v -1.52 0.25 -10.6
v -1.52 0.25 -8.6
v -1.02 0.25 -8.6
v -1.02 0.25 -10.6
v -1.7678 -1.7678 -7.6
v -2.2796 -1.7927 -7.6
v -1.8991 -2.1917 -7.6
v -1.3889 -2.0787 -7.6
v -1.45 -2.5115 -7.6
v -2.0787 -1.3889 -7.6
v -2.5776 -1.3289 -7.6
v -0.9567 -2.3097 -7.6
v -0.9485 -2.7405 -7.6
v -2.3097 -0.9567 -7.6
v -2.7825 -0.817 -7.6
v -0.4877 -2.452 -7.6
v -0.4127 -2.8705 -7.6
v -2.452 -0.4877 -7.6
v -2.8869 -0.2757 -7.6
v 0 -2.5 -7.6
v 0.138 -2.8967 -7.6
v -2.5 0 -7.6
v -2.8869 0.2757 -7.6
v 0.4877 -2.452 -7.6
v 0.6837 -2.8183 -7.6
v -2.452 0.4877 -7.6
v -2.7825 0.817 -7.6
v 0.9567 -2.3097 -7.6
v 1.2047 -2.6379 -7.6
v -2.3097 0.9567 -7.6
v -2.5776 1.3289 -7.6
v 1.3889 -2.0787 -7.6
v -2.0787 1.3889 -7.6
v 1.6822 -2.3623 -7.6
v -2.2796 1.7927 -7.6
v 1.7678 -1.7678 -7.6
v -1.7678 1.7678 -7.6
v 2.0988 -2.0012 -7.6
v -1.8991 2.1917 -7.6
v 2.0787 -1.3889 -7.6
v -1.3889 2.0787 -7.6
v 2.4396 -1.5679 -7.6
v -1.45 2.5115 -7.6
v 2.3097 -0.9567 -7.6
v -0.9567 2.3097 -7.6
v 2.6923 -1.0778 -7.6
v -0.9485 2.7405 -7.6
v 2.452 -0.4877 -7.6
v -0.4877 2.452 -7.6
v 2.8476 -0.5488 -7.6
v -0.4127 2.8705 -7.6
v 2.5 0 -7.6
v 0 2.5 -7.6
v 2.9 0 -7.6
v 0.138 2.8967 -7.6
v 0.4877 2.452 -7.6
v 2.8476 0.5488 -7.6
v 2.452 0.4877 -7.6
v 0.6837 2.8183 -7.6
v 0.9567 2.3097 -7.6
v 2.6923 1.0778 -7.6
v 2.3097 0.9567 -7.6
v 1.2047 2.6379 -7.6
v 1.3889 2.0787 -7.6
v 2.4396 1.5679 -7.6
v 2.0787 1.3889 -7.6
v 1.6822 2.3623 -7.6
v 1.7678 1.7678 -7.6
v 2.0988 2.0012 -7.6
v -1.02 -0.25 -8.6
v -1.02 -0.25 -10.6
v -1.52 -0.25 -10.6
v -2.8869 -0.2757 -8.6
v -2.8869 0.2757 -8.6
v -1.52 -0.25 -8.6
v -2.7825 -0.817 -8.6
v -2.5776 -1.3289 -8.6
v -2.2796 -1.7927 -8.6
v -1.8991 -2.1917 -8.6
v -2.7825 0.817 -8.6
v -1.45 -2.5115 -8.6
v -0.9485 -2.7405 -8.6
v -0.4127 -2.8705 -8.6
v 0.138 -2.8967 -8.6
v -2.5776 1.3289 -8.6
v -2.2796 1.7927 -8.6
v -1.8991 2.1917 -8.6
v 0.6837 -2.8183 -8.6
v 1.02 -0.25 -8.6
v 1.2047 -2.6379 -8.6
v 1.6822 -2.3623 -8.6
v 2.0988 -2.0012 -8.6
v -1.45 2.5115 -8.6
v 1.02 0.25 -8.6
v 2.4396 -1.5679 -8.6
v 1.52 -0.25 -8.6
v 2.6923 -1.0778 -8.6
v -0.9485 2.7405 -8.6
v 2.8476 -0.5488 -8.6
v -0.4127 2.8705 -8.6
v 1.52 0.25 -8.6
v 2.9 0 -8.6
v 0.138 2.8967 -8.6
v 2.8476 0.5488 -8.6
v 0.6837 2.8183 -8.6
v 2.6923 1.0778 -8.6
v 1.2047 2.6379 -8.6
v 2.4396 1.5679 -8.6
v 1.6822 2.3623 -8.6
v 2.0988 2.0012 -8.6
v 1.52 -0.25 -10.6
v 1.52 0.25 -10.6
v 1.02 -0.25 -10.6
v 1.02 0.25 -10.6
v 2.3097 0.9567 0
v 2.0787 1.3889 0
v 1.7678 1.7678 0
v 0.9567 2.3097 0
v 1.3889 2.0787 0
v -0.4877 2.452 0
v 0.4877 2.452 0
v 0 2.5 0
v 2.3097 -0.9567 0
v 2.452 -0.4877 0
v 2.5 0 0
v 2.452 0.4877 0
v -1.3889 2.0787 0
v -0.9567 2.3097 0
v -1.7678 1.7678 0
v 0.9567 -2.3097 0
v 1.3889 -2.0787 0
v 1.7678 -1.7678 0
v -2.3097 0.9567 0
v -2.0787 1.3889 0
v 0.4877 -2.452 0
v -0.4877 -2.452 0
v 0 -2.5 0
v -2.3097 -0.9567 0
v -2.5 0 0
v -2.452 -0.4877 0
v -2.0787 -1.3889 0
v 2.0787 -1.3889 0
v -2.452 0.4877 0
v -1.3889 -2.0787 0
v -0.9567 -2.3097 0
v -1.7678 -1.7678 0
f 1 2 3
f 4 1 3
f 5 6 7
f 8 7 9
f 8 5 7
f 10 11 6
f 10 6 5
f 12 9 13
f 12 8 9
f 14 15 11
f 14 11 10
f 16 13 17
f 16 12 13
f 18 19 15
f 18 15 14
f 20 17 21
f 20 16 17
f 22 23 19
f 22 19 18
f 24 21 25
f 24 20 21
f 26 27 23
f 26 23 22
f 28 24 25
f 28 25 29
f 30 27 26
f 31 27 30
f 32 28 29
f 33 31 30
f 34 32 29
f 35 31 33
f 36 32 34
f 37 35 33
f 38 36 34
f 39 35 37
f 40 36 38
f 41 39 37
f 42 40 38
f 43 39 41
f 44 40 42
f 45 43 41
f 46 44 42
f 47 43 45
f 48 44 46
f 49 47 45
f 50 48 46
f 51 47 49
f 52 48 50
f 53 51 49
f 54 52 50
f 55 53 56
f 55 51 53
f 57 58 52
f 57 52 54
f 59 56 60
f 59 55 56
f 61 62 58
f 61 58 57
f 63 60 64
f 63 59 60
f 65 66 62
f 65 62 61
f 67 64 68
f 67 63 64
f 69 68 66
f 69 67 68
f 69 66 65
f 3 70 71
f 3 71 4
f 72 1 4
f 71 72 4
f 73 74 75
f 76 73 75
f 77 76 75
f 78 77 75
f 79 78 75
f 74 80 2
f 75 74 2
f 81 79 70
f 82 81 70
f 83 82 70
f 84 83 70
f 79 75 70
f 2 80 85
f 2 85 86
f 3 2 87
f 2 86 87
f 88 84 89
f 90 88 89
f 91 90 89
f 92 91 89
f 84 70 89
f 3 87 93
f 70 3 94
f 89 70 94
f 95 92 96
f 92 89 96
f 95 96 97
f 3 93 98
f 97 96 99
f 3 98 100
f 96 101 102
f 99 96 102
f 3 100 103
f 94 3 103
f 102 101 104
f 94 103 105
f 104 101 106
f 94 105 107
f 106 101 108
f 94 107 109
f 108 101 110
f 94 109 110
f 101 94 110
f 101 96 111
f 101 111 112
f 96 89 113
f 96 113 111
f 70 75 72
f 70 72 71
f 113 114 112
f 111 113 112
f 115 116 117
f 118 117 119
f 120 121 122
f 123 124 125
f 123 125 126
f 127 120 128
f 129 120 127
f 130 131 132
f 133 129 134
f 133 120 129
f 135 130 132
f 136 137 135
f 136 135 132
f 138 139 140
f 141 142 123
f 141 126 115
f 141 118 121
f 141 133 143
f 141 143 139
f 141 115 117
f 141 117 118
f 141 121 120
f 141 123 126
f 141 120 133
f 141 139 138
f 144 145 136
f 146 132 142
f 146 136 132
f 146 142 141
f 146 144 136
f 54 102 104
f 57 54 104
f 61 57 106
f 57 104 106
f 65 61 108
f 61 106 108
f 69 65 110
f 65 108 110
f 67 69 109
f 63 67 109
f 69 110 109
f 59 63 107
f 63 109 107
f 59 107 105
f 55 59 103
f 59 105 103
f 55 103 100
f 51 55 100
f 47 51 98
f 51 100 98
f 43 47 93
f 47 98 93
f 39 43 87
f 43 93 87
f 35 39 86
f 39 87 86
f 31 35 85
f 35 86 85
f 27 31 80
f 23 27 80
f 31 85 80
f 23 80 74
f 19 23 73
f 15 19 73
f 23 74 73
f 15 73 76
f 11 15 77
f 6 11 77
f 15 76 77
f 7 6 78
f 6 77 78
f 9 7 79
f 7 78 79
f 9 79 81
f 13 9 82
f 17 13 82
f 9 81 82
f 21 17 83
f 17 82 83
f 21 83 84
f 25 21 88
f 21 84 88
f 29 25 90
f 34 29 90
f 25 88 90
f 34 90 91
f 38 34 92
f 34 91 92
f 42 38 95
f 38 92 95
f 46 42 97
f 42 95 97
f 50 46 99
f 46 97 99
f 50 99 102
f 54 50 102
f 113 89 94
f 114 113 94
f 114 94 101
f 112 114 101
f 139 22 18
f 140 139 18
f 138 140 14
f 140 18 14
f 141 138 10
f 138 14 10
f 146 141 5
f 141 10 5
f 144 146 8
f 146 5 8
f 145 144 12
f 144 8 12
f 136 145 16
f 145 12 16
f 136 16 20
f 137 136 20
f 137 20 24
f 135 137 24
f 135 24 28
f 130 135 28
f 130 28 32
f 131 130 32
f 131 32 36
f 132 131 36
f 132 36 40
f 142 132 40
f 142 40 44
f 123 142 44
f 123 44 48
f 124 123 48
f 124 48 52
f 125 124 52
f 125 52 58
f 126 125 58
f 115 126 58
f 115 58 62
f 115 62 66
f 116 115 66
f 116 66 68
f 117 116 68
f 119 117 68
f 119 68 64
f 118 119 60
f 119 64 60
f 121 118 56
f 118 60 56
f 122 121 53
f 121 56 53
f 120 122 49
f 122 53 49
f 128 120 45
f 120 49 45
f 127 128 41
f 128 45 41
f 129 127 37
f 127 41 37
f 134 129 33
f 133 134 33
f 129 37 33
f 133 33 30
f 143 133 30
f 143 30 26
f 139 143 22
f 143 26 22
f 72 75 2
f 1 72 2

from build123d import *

# Parameters (mm, degrees)
BODY_START   = -8.6
SKETCH1_R    = 2.5
BODY_DEPTH   = 8.6
FLANGE_START = -8.6
SKETCH2_R    = 2.9
FLANGE_DEPTH = 1
LEADS_START  = -8.6
SKETCH3_W    = 0.5
SKETCH3_H    = 0.5
LEADS_DEPTH  = 2


with BuildPart() as part:
    # Sketch1 → Body (new body)
    with BuildSketch(Plane.XY.offset(BODY_START)):
        with Locations(Location((0, 0, 0), (0, 0, 180))):
            Circle(SKETCH1_R)
    extrude(amount=BODY_DEPTH)

    # Sketch2 → Flange (add)
    with BuildSketch(Plane.XY.offset(FLANGE_START)):
        Circle(SKETCH2_R)
    extrude(amount=FLANGE_DEPTH)

    # Sketch3 → Leads (add)
    with BuildSketch(Plane.XY.offset(LEADS_START)):
        with Locations((-1.27, 0)):
            Rectangle(SKETCH3_W, SKETCH3_H)
        with Locations((1.27, 0)):
            Rectangle(SKETCH3_W, SKETCH3_H)
    extrude(amount=-LEADS_DEPTH)


solid = part.part
